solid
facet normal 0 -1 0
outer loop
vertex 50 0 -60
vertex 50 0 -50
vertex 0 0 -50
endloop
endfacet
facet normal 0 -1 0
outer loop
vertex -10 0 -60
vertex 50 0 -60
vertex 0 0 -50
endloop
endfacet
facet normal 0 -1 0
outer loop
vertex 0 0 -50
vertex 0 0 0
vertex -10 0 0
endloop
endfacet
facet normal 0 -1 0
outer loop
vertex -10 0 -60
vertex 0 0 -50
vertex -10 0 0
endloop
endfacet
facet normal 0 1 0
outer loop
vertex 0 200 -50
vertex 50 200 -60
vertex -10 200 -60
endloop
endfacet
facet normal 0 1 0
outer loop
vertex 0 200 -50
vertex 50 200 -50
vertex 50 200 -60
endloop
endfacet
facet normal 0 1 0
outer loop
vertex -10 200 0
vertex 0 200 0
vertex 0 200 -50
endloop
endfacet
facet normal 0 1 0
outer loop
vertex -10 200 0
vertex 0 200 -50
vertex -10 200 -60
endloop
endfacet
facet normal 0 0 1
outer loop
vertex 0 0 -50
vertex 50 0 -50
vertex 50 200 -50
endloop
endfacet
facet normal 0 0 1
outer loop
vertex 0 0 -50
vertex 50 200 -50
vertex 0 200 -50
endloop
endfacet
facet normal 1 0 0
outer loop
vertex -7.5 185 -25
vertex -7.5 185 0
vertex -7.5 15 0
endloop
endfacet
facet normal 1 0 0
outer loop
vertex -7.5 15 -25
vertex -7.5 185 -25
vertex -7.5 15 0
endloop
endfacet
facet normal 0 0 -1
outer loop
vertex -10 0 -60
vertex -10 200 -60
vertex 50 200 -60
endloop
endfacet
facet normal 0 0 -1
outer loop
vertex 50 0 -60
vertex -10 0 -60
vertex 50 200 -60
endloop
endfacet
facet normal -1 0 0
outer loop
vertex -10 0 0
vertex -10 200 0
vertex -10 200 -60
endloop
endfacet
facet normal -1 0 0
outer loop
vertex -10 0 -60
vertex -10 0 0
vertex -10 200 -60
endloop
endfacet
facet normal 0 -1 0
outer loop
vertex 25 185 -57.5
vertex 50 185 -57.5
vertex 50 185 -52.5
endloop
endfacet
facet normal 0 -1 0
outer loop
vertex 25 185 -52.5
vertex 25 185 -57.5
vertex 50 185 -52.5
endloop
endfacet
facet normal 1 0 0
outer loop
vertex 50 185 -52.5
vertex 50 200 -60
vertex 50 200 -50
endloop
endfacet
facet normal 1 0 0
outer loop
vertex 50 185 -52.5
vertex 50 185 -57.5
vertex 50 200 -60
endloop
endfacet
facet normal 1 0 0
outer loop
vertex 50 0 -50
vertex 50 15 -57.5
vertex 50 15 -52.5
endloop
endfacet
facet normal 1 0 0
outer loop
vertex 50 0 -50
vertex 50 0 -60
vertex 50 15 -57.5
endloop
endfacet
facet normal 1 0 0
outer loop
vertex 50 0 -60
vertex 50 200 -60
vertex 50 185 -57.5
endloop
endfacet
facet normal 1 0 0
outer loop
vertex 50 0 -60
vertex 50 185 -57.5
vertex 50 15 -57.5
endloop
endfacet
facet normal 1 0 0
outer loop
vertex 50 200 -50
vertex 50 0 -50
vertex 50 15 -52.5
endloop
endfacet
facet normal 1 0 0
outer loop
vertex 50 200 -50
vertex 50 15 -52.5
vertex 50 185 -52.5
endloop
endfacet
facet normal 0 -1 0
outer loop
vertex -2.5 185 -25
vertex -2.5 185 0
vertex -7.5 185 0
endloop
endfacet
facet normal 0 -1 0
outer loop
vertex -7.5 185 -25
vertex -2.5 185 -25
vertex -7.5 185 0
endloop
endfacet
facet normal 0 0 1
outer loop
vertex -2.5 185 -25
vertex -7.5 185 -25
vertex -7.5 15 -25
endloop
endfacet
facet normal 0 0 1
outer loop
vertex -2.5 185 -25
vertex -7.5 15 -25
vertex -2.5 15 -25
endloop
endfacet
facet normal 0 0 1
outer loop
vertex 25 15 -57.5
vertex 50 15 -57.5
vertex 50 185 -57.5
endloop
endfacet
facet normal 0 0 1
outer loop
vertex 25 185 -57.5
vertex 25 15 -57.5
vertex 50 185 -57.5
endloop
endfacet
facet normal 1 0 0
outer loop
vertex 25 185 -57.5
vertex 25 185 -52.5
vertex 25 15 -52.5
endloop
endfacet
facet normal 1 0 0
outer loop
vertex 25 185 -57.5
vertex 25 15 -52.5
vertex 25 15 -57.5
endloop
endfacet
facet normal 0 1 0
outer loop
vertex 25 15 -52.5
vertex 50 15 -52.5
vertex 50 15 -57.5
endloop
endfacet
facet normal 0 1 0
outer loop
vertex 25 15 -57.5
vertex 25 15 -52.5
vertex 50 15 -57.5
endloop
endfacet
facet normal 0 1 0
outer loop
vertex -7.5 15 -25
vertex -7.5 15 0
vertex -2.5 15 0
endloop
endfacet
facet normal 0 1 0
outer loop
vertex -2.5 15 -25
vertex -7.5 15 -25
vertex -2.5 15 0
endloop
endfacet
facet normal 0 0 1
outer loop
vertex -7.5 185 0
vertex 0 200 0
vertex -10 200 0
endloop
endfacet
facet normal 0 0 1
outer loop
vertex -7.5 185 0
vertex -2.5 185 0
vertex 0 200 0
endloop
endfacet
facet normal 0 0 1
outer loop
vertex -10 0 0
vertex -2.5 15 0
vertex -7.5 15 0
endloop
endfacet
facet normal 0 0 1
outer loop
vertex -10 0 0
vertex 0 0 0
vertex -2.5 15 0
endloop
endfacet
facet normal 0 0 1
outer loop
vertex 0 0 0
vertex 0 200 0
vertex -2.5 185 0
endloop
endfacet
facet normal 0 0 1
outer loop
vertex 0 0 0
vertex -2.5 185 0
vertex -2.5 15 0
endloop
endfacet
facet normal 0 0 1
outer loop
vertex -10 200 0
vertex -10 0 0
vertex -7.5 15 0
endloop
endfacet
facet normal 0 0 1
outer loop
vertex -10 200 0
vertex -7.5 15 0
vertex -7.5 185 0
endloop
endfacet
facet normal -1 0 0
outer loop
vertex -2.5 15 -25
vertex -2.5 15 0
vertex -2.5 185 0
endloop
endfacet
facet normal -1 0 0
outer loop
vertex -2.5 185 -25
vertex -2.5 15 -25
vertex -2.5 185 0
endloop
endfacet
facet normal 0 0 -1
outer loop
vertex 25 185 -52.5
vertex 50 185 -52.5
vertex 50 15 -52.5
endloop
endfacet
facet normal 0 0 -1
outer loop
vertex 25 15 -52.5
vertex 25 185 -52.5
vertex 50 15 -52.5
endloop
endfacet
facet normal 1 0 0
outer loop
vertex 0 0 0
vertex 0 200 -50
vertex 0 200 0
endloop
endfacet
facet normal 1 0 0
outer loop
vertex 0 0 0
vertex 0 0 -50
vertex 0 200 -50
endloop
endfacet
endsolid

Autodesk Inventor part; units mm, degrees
ref_plane "YZ Plane" through (0, 0, 0) normal (1, 0, 0) x (0, 1, 0)
ref_plane "XZ Plane" through (0, 0, 0) normal (0, 1, 0) x (-1, 0, 0)
ref_plane "XY Plane" through (0, 0, 0) normal (0, 0, 1) x (1, 0, 0)
sketch "Sketch1" plane through (0, 0, 0) normal (0, 1, 0) x (-1, 0, 0)
  line L0 (0, 0) -> (10, 0)
  line L1 (10, 0) -> (10, -60)
  line L2 (10, -60) -> (0, -60)
  line L3 (0, -60) -> (0, 0)
  line L4 (10, -60) -> (-50, -60)
  line L5 (-50, -60) -> (-50, -50)
  line L6 (-50, -50) -> (10, -50)
  line L7 (10, -50) -> (10, -60)
  point P0 (0, -50)
  point P1 (0, -60)
  dimension "d0" = 10
  dimension "d1" = 60
  dimension "d2" = 60
  dimension "d3" = 10
extrude "Extrusion1" add sketch "Sketch1" along normal blind 200
sketch "Sketch2" plane through (-10, 0, 0) normal (0, 0, 1) x (1, 0, 0)
  line L0 (2.5, 15) -> (7.5, 15)
  line L1 (7.5, 15) -> (7.5, 185)
  line L2 (7.5, 185) -> (2.5, 185)
  line L3 (2.5, 185) -> (2.5, 15)
  point P0 (10, 0)
  dimension "d6" = 5
  dimension "d7" = 170
extrude "Extrusion2" cut sketch "Sketch2" against normal blind 25
sketch "Sketch3" plane through (50, 0, -50) normal (1, 0, 0) x (0, 0, -1)
  line L0 (2.5, 15) -> (7.5, 15)
  line L1 (7.5, 15) -> (7.5, 185)
  line L2 (7.5, 185) -> (2.5, 185)
  line L3 (2.5, 185) -> (2.5, 15)
  point P0 (-50, 0)
  dimension "d10" = 5
  dimension "d11" = 170
extrude "Extrusion3" cut sketch "Sketch3" against normal blind 25
properties part number "TSU_FF_Corner_Wall"
